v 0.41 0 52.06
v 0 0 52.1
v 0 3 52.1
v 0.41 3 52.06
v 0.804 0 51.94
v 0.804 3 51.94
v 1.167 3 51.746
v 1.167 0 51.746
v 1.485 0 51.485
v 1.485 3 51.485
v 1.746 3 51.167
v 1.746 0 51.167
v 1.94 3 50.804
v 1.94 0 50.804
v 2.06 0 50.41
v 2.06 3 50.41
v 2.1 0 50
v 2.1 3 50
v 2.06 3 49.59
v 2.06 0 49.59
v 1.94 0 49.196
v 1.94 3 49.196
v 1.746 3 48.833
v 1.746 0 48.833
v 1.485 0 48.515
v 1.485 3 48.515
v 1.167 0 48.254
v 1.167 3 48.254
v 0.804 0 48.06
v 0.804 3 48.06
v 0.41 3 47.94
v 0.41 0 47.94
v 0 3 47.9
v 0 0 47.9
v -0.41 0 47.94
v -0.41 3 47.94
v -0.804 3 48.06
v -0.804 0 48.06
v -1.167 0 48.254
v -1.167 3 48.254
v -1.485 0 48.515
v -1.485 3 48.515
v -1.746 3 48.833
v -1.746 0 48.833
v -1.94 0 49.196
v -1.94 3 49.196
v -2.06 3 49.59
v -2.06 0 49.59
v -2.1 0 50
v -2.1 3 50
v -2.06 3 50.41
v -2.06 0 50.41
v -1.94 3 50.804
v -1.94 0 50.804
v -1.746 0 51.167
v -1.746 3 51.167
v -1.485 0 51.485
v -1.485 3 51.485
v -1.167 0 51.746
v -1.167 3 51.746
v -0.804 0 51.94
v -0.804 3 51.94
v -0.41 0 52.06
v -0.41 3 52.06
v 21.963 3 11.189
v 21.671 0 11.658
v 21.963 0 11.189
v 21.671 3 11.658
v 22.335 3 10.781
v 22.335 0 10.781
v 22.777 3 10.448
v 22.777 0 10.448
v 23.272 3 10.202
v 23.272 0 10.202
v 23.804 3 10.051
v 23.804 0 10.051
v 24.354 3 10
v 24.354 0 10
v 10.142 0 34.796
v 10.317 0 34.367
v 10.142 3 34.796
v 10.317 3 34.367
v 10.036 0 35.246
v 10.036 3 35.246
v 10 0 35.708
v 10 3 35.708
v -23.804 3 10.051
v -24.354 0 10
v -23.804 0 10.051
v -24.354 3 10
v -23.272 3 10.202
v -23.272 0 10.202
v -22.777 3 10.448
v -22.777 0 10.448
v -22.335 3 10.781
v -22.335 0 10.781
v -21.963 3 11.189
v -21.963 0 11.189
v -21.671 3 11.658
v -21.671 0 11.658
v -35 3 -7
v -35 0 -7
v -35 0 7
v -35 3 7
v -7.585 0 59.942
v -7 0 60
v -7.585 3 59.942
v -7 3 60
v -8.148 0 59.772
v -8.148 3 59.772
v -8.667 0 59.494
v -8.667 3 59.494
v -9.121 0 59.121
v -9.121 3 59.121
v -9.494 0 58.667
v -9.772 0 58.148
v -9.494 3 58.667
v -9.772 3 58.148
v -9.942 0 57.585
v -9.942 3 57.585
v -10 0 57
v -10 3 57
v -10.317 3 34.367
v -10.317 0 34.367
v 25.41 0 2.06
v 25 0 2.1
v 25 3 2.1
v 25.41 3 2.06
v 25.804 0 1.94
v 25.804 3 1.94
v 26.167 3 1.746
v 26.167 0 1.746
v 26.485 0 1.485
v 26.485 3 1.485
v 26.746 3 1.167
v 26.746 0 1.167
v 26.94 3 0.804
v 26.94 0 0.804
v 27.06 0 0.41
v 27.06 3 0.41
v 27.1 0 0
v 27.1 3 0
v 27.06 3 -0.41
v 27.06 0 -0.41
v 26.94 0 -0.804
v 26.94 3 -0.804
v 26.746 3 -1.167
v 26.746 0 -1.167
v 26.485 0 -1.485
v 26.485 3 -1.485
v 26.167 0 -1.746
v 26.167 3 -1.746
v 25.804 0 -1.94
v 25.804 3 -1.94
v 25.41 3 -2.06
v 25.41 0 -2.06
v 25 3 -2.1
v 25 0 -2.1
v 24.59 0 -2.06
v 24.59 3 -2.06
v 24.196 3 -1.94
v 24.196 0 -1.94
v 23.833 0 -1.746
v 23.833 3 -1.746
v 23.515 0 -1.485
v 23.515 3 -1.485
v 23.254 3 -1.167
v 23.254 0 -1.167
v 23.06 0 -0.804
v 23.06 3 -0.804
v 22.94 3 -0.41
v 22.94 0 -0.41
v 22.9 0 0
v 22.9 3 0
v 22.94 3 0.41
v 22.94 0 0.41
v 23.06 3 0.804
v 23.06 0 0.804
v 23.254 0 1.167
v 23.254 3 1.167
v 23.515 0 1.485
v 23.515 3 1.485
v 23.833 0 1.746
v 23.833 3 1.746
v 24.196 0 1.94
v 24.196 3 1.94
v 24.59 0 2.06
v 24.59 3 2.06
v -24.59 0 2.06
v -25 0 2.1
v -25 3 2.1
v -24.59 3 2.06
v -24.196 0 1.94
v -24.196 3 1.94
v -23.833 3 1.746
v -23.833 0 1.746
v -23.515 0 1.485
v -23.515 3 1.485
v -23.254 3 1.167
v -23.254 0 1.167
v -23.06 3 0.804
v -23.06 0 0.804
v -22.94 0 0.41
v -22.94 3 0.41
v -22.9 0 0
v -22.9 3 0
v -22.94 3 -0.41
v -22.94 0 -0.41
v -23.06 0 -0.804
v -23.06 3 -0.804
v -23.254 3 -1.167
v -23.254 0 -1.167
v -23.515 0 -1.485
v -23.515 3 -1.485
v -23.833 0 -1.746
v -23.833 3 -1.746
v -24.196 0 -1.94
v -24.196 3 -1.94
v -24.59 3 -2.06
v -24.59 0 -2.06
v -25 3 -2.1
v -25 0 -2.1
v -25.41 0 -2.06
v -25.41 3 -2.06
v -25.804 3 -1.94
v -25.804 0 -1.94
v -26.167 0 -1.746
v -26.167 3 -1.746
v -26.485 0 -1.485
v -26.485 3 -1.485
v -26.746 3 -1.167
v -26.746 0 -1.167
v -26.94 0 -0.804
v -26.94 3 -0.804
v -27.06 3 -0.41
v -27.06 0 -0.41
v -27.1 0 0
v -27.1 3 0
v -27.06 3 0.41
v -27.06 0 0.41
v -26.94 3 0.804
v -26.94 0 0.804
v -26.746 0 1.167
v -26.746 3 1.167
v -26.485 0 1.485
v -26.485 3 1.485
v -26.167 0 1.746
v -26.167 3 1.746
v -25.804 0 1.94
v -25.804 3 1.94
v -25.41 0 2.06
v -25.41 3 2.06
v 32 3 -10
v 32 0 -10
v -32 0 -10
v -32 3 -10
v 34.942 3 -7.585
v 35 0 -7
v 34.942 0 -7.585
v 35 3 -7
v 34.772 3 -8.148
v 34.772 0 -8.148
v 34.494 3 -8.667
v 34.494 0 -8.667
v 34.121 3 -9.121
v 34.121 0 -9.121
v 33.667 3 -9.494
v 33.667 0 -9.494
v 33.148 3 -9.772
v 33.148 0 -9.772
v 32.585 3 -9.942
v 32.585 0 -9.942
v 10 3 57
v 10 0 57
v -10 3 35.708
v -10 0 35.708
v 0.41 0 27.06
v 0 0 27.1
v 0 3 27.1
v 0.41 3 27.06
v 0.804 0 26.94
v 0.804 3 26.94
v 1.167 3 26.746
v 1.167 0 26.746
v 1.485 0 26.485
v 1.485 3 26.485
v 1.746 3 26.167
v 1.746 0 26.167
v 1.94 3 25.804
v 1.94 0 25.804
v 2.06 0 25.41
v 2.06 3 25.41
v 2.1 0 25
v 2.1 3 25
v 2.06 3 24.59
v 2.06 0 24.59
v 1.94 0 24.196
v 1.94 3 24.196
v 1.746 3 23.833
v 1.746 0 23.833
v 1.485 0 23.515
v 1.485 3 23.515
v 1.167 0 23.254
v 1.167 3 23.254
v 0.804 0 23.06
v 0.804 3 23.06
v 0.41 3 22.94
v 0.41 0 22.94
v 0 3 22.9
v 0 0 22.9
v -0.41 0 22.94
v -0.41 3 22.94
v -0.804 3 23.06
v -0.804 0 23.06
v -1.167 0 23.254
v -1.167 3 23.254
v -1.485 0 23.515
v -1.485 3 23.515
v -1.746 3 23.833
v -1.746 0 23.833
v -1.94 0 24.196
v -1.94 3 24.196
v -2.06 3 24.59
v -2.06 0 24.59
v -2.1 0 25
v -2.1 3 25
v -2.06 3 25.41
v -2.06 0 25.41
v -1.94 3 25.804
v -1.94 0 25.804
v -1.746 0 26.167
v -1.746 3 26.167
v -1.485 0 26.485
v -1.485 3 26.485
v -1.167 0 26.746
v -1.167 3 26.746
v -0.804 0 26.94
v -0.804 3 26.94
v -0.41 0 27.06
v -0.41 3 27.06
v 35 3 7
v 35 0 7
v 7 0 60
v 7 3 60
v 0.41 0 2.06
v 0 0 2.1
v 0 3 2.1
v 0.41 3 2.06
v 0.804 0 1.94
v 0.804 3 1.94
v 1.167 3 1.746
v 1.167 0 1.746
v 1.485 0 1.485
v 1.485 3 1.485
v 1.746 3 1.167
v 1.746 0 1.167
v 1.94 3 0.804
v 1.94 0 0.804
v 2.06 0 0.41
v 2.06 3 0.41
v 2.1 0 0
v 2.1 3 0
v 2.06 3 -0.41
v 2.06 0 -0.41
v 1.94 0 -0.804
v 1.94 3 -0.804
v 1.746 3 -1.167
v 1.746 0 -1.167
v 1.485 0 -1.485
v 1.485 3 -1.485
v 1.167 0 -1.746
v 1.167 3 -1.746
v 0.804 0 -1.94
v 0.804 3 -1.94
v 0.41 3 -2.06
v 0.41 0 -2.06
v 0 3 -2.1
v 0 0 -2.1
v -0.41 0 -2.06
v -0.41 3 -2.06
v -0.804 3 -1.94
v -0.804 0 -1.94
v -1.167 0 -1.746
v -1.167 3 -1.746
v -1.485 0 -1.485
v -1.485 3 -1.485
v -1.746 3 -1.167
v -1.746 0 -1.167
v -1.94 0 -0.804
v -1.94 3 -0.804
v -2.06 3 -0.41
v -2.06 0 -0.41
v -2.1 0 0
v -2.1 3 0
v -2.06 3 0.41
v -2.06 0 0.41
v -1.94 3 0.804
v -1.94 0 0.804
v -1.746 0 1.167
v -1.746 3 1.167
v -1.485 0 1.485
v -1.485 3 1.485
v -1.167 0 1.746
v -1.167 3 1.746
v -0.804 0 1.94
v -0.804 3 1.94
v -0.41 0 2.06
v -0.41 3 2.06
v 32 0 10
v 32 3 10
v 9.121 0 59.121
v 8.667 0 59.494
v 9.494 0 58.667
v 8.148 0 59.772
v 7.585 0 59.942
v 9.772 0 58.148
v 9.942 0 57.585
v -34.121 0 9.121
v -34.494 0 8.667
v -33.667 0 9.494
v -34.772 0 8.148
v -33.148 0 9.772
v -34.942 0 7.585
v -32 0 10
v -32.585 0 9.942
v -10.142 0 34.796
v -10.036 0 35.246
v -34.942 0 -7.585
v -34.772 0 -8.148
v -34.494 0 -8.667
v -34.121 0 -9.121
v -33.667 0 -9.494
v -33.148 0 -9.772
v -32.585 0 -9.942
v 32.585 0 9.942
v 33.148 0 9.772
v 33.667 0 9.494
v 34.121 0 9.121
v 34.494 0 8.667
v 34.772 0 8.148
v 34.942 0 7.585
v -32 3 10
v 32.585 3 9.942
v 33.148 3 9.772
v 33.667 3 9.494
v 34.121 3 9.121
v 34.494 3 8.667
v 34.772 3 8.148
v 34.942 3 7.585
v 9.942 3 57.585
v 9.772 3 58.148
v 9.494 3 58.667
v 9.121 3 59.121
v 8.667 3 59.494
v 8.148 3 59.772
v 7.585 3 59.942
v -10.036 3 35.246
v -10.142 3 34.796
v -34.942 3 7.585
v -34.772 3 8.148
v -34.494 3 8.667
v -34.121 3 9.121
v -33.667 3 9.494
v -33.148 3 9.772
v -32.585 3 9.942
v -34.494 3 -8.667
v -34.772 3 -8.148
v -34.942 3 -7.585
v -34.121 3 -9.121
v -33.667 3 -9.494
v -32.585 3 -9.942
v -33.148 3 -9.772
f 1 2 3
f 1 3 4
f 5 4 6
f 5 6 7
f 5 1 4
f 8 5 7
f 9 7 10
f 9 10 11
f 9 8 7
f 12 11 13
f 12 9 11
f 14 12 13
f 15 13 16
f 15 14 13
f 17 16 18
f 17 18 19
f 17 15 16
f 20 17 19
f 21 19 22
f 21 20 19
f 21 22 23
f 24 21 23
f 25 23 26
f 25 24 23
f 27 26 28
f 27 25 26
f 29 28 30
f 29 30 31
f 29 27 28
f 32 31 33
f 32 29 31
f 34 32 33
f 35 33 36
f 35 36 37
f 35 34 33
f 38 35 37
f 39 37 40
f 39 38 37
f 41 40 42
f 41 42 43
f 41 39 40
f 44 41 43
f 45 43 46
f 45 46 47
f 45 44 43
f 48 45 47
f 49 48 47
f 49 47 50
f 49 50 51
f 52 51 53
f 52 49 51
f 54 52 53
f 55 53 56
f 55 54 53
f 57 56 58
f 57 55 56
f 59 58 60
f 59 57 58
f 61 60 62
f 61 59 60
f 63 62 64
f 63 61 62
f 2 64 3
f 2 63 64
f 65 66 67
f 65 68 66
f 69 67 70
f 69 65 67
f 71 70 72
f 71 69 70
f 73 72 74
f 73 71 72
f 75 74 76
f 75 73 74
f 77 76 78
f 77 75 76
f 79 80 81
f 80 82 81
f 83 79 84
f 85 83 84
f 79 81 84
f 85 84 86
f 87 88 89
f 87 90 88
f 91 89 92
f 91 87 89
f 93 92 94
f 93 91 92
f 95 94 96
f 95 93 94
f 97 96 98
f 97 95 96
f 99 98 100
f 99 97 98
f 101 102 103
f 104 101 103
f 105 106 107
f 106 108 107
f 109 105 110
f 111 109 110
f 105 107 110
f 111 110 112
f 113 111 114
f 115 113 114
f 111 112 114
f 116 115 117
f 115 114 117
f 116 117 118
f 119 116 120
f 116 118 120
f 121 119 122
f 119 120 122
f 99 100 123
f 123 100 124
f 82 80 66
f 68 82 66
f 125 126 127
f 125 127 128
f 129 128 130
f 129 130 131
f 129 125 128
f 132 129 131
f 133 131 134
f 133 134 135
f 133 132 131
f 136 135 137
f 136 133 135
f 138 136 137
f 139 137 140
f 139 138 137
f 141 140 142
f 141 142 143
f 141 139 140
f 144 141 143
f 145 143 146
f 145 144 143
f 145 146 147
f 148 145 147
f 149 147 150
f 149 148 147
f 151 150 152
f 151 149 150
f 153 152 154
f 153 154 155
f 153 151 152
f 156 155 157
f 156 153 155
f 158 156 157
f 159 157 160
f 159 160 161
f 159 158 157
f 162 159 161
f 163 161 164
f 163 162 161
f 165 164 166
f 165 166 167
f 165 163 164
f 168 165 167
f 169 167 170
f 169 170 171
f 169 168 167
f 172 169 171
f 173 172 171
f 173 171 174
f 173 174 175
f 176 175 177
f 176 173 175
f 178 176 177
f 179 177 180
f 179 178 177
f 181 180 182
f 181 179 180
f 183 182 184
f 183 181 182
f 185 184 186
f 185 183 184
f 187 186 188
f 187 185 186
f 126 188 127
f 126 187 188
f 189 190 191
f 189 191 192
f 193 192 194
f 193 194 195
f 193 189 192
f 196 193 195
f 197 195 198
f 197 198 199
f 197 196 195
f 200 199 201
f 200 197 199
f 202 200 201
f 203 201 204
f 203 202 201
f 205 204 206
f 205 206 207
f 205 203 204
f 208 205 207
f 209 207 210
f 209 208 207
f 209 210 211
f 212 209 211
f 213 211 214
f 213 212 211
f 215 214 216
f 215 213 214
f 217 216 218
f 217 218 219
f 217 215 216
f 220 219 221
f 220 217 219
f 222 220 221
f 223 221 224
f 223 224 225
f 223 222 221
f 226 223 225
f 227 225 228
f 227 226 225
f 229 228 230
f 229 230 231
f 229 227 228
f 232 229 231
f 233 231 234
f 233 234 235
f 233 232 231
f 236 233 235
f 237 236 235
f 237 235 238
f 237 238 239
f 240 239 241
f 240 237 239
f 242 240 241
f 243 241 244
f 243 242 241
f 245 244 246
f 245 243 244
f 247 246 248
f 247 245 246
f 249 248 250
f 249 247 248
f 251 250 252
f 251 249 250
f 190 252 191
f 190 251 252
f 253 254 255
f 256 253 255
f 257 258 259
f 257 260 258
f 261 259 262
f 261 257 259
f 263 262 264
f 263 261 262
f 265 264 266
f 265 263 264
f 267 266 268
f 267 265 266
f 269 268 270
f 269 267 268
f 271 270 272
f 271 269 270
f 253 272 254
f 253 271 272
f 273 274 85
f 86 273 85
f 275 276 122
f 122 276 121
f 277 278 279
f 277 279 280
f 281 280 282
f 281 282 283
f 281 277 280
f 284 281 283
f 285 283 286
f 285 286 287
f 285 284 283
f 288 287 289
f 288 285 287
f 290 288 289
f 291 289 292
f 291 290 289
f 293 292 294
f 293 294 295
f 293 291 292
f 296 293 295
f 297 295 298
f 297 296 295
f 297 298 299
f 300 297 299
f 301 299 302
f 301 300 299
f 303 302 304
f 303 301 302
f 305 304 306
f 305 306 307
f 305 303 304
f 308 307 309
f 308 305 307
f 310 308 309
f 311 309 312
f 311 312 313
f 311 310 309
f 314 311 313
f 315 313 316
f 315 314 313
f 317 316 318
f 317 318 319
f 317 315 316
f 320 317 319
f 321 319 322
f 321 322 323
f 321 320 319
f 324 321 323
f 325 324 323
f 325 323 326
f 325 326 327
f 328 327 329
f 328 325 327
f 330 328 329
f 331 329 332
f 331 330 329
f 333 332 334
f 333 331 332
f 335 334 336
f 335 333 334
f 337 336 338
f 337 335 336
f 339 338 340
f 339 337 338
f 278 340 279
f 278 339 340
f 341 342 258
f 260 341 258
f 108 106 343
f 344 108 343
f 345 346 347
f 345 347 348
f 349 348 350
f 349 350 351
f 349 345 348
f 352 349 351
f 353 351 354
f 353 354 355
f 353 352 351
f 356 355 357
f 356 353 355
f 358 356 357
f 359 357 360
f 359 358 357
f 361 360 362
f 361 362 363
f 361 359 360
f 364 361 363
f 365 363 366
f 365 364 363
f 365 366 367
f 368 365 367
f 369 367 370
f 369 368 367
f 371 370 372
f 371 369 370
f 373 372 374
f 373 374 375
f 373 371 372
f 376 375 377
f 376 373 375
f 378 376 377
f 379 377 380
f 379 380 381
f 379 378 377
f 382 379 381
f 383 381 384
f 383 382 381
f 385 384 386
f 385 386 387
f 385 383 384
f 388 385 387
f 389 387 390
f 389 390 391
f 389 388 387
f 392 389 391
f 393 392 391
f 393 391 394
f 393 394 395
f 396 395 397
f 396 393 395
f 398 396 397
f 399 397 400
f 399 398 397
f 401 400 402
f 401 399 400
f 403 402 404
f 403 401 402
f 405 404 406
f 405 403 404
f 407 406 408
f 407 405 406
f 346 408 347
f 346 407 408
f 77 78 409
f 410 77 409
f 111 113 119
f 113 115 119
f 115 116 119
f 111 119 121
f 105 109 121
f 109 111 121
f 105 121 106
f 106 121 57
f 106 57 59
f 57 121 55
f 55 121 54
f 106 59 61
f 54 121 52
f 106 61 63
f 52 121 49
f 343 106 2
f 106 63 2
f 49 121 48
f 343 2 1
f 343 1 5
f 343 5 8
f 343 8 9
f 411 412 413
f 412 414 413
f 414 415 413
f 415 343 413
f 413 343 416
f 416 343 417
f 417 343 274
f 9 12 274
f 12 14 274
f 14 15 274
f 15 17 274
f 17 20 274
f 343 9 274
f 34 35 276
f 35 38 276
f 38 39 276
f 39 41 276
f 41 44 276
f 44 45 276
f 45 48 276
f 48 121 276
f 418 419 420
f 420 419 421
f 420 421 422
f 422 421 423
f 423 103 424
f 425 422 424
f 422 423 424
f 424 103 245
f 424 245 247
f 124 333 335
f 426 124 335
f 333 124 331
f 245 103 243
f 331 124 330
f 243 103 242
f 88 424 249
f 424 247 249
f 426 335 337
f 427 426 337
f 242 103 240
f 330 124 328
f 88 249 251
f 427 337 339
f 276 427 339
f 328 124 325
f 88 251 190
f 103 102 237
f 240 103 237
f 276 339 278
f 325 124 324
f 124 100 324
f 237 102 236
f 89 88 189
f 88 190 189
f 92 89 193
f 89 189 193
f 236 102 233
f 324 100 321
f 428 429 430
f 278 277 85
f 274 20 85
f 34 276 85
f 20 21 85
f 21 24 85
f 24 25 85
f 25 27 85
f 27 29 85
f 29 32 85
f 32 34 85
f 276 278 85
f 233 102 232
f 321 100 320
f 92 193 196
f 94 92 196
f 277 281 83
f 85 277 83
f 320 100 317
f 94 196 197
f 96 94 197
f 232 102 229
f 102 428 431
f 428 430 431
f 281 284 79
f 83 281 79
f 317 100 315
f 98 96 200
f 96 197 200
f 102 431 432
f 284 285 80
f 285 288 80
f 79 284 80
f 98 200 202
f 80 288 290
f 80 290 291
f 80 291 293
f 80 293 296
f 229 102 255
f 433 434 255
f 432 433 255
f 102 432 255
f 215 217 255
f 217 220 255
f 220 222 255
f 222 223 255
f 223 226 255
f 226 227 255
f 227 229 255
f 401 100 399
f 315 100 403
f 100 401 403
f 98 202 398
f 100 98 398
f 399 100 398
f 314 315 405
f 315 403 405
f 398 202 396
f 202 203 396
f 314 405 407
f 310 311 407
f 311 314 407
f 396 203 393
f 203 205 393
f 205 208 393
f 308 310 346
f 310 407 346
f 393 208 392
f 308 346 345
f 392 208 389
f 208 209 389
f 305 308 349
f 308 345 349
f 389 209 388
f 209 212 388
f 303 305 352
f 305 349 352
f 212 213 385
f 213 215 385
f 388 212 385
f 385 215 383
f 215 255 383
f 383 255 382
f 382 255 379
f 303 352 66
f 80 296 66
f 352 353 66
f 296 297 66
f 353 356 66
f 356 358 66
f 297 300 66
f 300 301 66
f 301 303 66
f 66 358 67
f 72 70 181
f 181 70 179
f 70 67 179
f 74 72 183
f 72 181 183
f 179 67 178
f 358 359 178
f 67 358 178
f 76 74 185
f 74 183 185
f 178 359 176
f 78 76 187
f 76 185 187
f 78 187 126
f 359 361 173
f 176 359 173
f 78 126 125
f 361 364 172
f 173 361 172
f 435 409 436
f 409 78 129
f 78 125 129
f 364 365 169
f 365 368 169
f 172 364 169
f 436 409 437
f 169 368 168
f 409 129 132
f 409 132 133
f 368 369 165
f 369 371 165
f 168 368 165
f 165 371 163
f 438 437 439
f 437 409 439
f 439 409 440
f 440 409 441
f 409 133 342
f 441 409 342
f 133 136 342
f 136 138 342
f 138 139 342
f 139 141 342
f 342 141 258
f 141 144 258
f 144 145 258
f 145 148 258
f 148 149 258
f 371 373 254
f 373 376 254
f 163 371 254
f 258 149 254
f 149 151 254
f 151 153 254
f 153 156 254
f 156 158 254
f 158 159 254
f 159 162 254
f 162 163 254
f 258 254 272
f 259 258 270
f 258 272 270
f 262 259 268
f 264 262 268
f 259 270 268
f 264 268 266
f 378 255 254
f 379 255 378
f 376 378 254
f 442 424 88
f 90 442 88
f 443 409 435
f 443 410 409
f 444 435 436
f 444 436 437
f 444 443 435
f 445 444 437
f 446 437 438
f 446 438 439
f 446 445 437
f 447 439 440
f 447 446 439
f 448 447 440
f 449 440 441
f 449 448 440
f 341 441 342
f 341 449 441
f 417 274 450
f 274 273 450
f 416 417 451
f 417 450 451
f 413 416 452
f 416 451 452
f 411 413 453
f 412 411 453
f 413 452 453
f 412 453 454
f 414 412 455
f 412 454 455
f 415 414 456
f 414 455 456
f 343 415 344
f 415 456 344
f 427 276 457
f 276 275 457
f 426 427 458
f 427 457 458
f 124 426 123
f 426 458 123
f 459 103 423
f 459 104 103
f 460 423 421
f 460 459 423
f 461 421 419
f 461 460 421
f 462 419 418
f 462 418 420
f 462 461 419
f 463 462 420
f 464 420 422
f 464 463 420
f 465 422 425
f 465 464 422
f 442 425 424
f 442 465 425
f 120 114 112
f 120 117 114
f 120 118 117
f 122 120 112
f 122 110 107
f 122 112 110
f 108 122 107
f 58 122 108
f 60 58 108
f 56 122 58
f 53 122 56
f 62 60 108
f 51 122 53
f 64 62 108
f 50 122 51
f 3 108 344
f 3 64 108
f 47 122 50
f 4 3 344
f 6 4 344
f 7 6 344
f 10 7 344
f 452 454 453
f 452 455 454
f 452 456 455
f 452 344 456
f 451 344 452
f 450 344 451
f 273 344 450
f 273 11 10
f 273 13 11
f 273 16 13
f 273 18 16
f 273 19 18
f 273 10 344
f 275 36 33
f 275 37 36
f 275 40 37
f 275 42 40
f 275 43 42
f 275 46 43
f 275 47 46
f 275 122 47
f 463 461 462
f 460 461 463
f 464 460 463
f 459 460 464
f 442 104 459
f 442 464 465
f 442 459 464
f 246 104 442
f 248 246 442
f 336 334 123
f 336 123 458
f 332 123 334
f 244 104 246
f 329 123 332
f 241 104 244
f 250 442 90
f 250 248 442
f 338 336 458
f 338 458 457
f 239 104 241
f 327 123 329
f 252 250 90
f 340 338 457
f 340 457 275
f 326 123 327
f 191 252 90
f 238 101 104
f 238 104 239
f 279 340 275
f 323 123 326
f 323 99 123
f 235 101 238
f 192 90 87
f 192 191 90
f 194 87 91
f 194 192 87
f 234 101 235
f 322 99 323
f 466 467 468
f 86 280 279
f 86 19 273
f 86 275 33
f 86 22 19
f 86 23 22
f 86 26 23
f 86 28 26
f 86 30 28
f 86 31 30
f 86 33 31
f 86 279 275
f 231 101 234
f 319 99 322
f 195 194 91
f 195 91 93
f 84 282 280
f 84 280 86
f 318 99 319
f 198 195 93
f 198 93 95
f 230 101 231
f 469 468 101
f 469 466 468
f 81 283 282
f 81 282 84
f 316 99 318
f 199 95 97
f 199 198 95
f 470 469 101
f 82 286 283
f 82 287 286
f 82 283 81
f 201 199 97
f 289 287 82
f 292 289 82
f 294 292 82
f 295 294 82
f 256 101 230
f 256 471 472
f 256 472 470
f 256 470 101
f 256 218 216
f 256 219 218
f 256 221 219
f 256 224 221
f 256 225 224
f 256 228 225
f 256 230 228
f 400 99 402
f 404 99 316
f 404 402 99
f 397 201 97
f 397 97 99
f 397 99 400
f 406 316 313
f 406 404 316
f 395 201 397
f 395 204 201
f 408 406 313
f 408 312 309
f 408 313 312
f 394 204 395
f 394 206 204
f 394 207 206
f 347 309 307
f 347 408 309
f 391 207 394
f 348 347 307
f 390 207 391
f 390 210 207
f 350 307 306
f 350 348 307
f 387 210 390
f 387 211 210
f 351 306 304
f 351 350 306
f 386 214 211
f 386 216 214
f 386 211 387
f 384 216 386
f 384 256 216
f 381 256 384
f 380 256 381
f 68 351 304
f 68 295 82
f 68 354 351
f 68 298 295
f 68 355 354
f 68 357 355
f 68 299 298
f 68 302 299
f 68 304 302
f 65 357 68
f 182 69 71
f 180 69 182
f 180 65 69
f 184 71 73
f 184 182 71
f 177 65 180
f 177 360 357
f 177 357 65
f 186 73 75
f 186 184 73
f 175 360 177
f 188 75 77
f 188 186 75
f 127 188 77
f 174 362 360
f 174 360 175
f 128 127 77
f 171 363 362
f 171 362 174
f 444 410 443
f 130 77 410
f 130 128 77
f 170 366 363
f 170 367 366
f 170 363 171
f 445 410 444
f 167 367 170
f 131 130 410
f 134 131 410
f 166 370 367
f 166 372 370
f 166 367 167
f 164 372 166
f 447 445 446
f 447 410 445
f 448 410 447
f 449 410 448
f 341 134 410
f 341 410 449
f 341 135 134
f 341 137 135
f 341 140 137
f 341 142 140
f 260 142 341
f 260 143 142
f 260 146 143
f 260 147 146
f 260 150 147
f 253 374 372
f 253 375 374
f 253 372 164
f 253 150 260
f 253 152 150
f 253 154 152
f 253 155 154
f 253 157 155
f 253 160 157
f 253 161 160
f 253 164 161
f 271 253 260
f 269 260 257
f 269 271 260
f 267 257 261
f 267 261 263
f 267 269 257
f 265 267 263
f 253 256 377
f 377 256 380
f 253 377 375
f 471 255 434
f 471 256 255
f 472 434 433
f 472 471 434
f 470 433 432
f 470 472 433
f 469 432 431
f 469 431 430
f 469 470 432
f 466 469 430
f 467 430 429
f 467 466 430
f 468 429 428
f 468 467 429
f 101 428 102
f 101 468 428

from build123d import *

# Parameters (mm, degrees)
SKETCH_1_R      = 2.1
EXTRUDE_1_DEPTH = 3
FILLET_1_R      = 3


with BuildPart() as part:
    # 草图1 → 凸台-拉伸1 (new body)
    # profile 1 of 3: a face of its own
    with BuildSketch(Plane(origin=(0, 0, 0), x_dir=(1, 0, 0), z_dir=(0, 1, 0))):
        Polygon((10, -10), (35, -10), (35, 10), (-35, 10), (-35, -10), (-10, -10), (-10, -60), (10, -60), align=None)
        with Locations(Location((0, -50, 0), (0, 0, 270))):
            Circle(SKETCH_1_R, mode=Mode.SUBTRACT)
        with Locations(Location((0, -25, 0), (0, 0, 270))):
            Circle(SKETCH_1_R, mode=Mode.SUBTRACT)
        with Locations(Location((-25, 0, 0), (0, 0, 270))):
            Circle(SKETCH_1_R, mode=Mode.SUBTRACT)
        with Locations(Location((25, 0, 0), (0, 0, 270))):
            Circle(SKETCH_1_R, mode=Mode.SUBTRACT)
        with Locations(Location((0, 0, 0), (0, 0, 270))):
            Circle(SKETCH_1_R, mode=Mode.SUBTRACT)
    # profile 2 of 3: a face of its own
    with BuildSketch(Plane(origin=(0, 0, 0), x_dir=(1, 0, 0), z_dir=(0, 1, 0))):
        Polygon((-10, -10), (-22.5, -10), (-10, -35), align=None)
    # profile 3 of 3: a face of its own
    with BuildSketch(Plane(origin=(0, 0, 0), x_dir=(1, 0, 0), z_dir=(0, 1, 0))):
        Polygon((10, -35), (22.5, -10), (10, -10), align=None)
    extrude(amount=EXTRUDE_1_DEPTH)

    # 圆角1
    fillet_1_edges = [part.edges().sort_by_distance(p)[0] for p in [
        (10, 1.5, 35),
        (10, 1.5, 60),
        (-10, 1.5, 60),
        (-10, 1.5, 35),
        (-22.5, 1.5, 10),
        (-35, 1.5, 10),
        (-35, 1.5, -10),
        (35, 1.5, -10),
        (35, 1.5, 10),
        (22.5, 1.5, 10),
    ]]
    fillet(fillet_1_edges, radius=FILLET_1_R)


solid = part.part
